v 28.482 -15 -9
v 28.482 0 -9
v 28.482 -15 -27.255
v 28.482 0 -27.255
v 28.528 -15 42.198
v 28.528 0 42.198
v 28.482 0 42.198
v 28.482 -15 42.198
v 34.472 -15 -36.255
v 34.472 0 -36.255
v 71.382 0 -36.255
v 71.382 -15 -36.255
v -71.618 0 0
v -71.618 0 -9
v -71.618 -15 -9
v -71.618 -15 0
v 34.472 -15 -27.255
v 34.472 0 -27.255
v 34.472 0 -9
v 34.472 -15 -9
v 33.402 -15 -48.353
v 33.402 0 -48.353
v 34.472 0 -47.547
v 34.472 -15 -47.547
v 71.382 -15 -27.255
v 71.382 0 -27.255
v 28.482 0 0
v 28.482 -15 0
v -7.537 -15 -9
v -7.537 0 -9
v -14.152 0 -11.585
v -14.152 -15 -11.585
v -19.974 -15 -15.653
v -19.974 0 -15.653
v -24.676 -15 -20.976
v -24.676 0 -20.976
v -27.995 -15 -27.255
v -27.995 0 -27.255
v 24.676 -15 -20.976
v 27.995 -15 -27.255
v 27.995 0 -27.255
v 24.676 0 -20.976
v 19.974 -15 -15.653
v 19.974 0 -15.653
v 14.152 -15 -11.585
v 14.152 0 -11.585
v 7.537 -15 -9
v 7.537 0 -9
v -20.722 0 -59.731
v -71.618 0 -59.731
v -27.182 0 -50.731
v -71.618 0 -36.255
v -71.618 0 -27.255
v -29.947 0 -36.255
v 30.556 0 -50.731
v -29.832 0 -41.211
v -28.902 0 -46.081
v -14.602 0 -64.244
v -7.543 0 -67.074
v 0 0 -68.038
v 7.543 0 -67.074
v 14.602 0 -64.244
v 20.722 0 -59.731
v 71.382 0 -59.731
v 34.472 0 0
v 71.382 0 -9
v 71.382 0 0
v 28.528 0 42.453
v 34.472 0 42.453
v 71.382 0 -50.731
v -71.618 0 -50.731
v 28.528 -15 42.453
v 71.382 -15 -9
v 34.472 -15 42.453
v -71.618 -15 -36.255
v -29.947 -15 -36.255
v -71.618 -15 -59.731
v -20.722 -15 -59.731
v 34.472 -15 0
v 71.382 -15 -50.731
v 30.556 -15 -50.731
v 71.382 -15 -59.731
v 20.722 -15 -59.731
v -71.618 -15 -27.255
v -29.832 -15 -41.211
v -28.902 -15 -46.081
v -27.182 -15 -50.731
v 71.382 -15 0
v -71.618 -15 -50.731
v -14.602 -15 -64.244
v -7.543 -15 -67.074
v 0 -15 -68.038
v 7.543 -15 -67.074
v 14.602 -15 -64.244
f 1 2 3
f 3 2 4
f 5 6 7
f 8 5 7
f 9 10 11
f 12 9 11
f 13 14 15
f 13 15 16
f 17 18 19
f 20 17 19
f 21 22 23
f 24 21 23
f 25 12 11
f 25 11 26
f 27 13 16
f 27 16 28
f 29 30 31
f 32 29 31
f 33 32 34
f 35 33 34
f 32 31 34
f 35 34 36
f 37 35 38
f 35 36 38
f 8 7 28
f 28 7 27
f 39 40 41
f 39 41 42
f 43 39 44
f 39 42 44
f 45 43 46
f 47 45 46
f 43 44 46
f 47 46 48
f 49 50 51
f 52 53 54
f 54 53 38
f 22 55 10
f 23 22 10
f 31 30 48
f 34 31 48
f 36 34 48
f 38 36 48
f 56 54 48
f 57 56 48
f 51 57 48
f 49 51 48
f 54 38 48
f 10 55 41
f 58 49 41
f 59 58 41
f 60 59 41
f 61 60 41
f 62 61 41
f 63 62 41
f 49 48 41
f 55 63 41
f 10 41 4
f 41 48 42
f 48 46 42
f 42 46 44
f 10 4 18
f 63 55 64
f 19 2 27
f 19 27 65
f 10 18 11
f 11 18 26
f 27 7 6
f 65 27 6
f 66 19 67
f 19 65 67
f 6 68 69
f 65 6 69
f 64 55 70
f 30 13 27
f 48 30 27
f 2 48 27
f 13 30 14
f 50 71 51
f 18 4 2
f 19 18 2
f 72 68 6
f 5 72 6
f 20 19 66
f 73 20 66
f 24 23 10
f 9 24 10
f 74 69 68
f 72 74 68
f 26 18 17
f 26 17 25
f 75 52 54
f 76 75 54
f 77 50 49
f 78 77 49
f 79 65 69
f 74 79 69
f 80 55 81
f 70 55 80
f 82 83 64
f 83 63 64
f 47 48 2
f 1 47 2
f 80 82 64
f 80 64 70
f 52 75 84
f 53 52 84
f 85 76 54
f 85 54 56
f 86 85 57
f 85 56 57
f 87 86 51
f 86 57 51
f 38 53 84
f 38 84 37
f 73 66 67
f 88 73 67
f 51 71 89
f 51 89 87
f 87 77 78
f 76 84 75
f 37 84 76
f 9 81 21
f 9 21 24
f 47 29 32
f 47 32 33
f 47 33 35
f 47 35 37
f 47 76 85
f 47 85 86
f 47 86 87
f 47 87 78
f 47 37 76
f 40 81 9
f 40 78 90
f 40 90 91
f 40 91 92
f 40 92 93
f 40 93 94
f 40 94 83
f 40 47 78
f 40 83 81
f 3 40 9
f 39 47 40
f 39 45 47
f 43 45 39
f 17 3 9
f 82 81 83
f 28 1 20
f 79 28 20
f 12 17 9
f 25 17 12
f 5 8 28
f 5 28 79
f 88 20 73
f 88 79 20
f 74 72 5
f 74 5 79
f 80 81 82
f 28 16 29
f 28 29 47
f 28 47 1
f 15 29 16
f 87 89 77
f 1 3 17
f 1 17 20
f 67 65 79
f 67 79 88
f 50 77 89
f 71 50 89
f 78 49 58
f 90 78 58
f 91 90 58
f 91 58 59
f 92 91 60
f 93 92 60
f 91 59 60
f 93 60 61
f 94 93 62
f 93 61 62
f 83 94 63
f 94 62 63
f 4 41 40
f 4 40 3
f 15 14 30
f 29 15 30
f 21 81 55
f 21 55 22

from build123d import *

# Parameters (mm, degrees)
F1_DEPTH = 15
F2_W     = 143
F2_H     = 9
F3_DEPTH = 15
F5_DEPTH = 15


with BuildPart() as f1:
    # F0 (on Front) → F1 (new body)
    with BuildSketch(Plane.XZ):
        with BuildLine():
            ThreePointArc((28.481948, -47.459981), (29.618056, -42.809614), (30, -38.03774))
            ThreePointArc((30, -38.03774), (29.618056, -33.265866), (28.481948, -28.615498))
            ThreePointArc((28.481948, -28.615498), (-29.557796, -32.905813), (23.638915, -56.509385))
            ThreePointArc((23.638915, -56.509385), (26.450312, -52.193338), (28.481948, -47.459981))
        make_face()
        with BuildLine():
            ThreePointArc((28.481948, -28.615498), (29.618056, -33.265866), (30, -38.03774))
            ThreePointArc((30, -38.03774), (29.618056, -42.809614), (28.481948, -47.459981))
            Line((28.481948, -47.459981), (34.471702, -47.459981))
            Line((34.471702, -47.459981), (34.471702, 42.198131))
            Line((34.471702, 42.198131), (28.481948, 42.198131))
            Line((28.481948, 42.198131), (28.481948, -28.615498))
        make_face()
        with BuildLine():
            Line((34.471702, -47.459981), (28.481948, -47.459981))
            ThreePointArc((28.481948, -47.459981), (26.450312, -52.193338), (23.638915, -56.509385))
            Line((23.638915, -56.509385), (34.471702, -47.459981))
        make_face()
    extrude(amount=F1_DEPTH)

    # F2 (on Front) → F3 (join)
    with BuildSketch(Plane.XZ):
        with Locations((-0.117924, -4.5)):
            Rectangle(F2_W, F2_H)
        with Locations((-0.117924, -31.754719)):
            Rectangle(F2_W, F2_H)
        with Locations((-0.117924, -55.231133)):
            Rectangle(F2_W, F2_H)
    extrude(amount=F3_DEPTH)

    # F4 (on Front) → F5 (join)
    with BuildSketch(Plane.XZ):
        with BuildLine():
            ThreePointArc((24.910641, -54.754796), (28.699471, -46.775038), (30, -38.03774))
            ThreePointArc((30, -38.03774), (29.629791, -33.339287), (28.528303, -28.756795))
            ThreePointArc((28.528303, -28.756795), (-29.713704, -33.903032), (24.910641, -54.754796))
        make_face()
        with BuildLine():
            ThreePointArc((28.528303, -28.756795), (29.629791, -33.339287), (30, -38.03774))
            ThreePointArc((30, -38.03774), (28.699471, -46.775038), (24.910641, -54.754796))
            Line((24.910641, -54.754796), (34.471702, -47.547173))
            Line((34.471702, -47.547173), (34.471702, 42.452827))
            Line((34.471702, 42.452827), (28.528303, 42.452827))
            Line((28.528303, 42.452827), (28.528303, -28.756795))
        make_face()
    extrude(amount=F5_DEPTH)


solid = f1.part
